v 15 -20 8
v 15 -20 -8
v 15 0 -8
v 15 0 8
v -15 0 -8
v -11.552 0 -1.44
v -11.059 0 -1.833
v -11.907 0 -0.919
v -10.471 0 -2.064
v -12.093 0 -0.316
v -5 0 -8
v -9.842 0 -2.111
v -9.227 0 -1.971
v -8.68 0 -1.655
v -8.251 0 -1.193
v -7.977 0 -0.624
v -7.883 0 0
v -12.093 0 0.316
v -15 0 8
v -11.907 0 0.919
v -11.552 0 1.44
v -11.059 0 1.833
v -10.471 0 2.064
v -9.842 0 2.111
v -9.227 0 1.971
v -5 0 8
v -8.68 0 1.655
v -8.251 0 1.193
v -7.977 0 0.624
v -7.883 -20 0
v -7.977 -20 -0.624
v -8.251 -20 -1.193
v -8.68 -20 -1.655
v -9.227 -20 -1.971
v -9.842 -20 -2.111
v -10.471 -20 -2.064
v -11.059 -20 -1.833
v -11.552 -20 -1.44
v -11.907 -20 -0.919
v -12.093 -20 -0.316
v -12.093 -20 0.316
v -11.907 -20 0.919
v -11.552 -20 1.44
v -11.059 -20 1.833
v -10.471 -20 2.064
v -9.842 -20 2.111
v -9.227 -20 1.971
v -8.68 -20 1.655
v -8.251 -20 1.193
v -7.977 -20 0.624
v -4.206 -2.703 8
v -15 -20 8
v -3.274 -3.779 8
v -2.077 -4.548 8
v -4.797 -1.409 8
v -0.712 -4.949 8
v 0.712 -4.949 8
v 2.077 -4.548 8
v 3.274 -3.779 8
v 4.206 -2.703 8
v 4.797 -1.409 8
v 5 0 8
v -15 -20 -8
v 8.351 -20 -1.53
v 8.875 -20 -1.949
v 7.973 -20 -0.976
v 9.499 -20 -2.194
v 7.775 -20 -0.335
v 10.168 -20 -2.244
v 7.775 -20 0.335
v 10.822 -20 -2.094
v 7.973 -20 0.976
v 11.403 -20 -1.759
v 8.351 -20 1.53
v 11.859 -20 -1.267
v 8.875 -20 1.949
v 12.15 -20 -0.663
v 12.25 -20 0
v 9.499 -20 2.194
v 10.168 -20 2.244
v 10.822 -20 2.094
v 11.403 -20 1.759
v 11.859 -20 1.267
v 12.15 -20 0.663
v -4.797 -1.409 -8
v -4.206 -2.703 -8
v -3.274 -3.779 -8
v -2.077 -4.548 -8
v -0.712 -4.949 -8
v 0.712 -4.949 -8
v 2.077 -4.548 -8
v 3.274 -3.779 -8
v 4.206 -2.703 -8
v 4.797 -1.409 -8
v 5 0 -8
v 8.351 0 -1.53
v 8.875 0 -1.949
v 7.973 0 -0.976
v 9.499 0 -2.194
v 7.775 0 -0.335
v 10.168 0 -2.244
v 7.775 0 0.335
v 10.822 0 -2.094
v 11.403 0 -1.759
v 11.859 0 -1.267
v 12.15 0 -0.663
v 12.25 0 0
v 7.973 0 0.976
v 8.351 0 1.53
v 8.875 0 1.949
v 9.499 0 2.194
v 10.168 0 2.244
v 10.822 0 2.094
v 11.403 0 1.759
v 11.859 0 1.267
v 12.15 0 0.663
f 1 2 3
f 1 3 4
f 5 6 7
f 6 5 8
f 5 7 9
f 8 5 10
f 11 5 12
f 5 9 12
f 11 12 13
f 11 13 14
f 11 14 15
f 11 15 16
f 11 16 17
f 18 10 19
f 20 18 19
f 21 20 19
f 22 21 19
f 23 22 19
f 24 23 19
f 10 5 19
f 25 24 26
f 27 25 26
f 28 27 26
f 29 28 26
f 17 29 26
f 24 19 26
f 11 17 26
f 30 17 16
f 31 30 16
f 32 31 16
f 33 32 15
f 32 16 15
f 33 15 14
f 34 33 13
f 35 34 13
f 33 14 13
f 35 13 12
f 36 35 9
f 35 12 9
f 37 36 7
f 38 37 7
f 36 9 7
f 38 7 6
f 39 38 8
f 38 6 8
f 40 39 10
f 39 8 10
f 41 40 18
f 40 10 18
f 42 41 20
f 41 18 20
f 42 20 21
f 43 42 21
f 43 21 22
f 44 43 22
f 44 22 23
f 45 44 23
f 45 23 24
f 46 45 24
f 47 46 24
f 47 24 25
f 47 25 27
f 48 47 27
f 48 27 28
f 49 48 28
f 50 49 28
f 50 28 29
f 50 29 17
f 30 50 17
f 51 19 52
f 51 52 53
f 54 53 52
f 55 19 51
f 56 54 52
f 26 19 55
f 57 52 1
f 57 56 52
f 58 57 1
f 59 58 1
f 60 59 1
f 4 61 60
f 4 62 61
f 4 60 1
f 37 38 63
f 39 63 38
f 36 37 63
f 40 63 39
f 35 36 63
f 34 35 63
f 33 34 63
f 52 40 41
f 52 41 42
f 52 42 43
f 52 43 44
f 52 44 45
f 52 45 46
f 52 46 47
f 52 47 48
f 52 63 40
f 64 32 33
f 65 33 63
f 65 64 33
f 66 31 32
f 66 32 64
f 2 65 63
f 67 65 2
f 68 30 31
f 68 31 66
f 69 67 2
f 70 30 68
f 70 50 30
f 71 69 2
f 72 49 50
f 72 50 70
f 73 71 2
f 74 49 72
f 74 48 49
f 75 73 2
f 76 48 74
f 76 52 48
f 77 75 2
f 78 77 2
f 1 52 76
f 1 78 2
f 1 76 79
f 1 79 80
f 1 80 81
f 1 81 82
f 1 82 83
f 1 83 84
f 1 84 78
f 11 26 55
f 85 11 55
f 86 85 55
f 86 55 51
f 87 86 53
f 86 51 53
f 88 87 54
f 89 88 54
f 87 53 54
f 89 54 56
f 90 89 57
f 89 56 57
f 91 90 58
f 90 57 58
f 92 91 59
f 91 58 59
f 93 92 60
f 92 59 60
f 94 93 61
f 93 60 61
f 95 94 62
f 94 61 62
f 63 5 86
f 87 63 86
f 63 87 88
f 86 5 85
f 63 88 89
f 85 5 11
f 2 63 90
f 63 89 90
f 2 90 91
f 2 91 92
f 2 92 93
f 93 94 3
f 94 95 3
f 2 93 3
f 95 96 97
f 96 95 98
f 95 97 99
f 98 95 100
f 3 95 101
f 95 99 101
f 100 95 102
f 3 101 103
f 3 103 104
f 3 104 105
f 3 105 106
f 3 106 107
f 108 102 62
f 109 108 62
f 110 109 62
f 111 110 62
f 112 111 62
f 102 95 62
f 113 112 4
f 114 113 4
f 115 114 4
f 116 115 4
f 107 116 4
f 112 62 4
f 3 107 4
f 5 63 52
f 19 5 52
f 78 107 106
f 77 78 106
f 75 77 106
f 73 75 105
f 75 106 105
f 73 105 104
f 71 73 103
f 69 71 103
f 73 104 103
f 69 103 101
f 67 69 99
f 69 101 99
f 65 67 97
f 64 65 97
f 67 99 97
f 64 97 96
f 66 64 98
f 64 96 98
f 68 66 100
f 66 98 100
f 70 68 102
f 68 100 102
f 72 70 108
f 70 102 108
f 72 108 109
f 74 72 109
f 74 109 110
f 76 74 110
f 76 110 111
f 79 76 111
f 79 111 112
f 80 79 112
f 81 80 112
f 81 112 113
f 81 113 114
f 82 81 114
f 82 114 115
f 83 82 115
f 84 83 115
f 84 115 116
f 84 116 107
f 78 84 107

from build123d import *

# Parameters (mm, degrees)
SKETCH_W        = 30
SKETCH_H        = 16
PAD_DEPTH       = 20
SKETCH001_R     = 5
POCKET_DEPTH    = 16.001
SKETCH002_R     = 2.117093
SKETCH002_R_2   = 2.25
POCKET001_DEPTH = 20.001


with BuildPart() as part:
    # Sketch → Pad (new body)
    with BuildSketch(Plane.XZ):
        Rectangle(SKETCH_W, SKETCH_H)
    extrude(amount=PAD_DEPTH)

    # Sketch001 → Pocket (cut, through all)
    with BuildSketch(Plane(origin=(0, 0, 8), x_dir=(-1, 0, 0), z_dir=(0, 0, 1))):
        Circle(SKETCH001_R)
    extrude(amount=-POCKET_DEPTH, mode=Mode.SUBTRACT)

    # Sketch002 → Pocket001 (cut, through all)
    with BuildSketch(Plane(origin=(0, 0, 0), x_dir=(1, 0, 0), z_dir=(0, 1, 0))):
        with Locations((-10, 0)):
            Circle(SKETCH002_R)
        with Locations((10, 0)):
            Circle(SKETCH002_R_2)
    extrude(amount=-POCKET001_DEPTH, mode=Mode.SUBTRACT)


solid = part.part
